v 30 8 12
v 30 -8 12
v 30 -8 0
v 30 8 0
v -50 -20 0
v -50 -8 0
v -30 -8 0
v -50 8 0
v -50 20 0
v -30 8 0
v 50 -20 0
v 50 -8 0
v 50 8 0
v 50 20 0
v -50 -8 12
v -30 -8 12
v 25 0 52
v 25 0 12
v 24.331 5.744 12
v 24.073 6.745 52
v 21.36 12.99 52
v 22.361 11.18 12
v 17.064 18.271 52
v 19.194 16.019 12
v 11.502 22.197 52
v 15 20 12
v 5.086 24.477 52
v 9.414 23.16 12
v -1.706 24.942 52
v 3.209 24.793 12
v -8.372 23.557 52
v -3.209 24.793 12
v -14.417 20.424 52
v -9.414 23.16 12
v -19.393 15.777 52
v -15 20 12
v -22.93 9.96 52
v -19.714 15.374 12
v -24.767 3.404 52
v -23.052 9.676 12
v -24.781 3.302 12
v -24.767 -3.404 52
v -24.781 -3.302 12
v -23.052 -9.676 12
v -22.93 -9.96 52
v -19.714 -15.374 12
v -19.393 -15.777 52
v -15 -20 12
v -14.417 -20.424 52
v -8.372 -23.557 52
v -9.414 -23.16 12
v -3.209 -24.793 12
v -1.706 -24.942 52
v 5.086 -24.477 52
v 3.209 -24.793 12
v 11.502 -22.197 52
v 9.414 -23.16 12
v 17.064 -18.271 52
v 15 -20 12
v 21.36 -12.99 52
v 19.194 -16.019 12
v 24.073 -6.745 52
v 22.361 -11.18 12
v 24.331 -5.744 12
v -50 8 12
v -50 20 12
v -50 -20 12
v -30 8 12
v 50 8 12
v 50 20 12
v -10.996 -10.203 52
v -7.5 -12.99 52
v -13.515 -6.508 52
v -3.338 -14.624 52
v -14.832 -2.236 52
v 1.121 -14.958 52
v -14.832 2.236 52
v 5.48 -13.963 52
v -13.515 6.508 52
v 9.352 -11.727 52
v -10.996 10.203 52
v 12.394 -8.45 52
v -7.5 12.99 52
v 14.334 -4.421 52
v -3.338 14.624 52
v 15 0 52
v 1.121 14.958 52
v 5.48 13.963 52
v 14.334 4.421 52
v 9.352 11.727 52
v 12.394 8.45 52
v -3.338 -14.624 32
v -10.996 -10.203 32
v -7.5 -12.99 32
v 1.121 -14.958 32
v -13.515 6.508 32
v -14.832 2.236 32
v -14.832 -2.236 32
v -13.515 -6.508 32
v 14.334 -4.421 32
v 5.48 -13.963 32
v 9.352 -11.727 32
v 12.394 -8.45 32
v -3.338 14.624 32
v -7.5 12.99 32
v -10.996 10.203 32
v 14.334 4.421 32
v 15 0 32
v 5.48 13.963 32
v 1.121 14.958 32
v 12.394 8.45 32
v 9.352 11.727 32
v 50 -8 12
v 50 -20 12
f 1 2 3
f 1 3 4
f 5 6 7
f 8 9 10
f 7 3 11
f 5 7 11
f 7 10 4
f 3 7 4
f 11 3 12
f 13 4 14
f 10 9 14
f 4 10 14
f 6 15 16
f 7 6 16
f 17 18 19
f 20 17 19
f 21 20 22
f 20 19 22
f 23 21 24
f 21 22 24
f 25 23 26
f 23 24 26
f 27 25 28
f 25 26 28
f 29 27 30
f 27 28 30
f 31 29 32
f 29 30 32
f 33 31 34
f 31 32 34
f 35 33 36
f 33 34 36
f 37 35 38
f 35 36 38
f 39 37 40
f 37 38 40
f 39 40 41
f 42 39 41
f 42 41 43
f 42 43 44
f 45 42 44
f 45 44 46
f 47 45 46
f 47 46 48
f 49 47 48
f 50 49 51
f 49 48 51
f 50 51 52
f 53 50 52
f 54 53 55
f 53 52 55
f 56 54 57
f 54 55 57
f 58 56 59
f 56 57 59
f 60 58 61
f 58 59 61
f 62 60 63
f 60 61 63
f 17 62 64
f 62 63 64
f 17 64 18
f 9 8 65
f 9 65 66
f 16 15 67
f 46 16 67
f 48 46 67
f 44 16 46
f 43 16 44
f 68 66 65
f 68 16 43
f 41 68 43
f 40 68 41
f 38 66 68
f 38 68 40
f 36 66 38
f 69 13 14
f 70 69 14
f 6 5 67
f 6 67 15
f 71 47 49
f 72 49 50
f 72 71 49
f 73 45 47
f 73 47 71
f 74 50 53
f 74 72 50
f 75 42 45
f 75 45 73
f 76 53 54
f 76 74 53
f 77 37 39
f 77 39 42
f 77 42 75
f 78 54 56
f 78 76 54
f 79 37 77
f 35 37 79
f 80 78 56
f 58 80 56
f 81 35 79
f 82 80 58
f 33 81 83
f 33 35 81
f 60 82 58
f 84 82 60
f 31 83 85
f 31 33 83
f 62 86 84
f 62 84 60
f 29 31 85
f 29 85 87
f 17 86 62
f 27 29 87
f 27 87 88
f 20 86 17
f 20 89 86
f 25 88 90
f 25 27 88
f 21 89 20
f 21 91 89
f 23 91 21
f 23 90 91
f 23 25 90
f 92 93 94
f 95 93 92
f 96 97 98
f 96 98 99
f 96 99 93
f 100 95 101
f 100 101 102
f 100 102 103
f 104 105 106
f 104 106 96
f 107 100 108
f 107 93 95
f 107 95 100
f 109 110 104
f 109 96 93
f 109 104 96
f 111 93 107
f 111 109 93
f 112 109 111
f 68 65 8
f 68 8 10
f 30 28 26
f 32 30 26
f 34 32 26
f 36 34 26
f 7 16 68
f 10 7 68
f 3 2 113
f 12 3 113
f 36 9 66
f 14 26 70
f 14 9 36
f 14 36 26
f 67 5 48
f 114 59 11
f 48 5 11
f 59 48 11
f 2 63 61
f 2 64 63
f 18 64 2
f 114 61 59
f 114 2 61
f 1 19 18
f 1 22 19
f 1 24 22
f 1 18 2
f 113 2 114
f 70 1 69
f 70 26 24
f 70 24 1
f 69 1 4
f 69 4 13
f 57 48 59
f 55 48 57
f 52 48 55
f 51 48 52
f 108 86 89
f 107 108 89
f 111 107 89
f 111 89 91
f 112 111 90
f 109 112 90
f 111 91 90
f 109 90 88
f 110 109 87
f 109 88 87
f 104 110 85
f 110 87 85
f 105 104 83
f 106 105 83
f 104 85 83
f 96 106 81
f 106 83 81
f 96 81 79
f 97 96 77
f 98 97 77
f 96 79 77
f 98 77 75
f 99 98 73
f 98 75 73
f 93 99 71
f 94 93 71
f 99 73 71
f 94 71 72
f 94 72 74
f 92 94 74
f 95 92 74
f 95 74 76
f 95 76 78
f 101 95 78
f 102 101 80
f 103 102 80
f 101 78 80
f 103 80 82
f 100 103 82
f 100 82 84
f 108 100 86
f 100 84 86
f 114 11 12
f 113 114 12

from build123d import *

# Parameters (mm, degrees)
F0_W     = 100
F0_H     = 40
F1_DEPTH = 12
F2_W     = 20
F2_H     = 16
F3_DEPTH = 12.001
F4_R     = 25
F5_DEPTH = 40
F6_R     = 15
F7_DEPTH = 20


with BuildPart() as f1:
    # F0 (on Top) → F1 (new body)
    with BuildSketch(Plane.XY):
        Rectangle(F0_W, F0_H)
    extrude(amount=F1_DEPTH)

    # F2 (on face) → F3 (cut, through all)
    with BuildSketch(Plane.XY.offset(12)):
        with Locations((-40, 0)):
            Rectangle(F2_W, F2_H)
        with Locations((40, 0)):
            Rectangle(F2_W, F2_H)
    extrude(amount=-F3_DEPTH, mode=Mode.SUBTRACT)

    # F4 (on face) → F5 (join)
    with BuildSketch(Plane.XY.offset(12)):
        Circle(F4_R)
    extrude(amount=F5_DEPTH)

    # F6 (on face) → F7 (cut)
    with BuildSketch(Plane.XY.offset(52)):
        Circle(F6_R)
    extrude(amount=-F7_DEPTH, mode=Mode.SUBTRACT)


solid = f1.part
